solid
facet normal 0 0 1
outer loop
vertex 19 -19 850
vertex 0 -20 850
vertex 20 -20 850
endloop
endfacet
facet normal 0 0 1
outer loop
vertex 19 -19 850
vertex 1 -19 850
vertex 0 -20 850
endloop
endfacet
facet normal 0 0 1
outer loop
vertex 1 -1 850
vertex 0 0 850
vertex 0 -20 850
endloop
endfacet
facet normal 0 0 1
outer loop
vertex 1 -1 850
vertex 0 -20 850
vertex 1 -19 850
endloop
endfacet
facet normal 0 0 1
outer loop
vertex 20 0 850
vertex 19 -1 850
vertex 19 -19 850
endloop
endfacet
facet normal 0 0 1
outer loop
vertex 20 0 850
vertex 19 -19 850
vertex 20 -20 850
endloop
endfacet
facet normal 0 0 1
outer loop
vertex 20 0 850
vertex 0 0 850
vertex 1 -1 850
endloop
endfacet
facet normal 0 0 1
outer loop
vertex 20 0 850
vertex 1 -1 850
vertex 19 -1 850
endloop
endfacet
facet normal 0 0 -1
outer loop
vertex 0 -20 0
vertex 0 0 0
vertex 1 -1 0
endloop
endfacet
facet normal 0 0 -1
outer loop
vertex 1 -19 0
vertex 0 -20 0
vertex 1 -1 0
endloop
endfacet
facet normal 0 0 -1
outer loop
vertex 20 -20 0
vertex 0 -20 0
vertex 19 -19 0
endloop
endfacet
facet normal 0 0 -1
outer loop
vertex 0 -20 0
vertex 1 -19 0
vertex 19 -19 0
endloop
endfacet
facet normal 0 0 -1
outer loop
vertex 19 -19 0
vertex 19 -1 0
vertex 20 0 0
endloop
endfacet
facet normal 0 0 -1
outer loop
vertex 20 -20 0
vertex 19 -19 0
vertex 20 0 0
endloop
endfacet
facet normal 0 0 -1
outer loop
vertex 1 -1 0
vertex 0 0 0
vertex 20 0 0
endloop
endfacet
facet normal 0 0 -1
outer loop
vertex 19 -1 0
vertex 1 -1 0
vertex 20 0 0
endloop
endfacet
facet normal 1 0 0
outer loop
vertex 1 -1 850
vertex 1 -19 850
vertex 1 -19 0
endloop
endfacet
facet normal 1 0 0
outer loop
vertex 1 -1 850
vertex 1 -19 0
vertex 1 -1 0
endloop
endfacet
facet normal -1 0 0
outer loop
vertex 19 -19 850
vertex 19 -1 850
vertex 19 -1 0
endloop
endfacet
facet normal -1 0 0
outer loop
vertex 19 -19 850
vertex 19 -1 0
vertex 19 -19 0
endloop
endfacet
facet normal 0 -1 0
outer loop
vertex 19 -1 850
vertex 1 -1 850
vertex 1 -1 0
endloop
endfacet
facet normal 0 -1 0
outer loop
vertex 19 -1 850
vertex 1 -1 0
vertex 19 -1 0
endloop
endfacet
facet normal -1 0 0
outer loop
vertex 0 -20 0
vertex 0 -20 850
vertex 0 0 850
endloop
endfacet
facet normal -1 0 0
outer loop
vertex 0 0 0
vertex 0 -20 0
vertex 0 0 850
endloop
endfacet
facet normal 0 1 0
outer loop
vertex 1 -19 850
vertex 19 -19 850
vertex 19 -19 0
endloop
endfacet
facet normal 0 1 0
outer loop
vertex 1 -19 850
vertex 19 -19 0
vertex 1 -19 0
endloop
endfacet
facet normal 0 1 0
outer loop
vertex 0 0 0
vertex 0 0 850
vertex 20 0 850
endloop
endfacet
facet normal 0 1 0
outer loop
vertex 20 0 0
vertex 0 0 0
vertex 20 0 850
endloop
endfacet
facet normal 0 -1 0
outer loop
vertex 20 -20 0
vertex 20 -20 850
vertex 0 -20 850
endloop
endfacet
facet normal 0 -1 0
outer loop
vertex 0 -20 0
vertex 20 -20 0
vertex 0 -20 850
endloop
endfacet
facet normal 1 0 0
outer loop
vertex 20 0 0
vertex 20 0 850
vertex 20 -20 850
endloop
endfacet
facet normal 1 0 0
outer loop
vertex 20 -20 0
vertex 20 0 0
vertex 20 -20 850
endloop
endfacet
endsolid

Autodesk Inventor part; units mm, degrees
ref_plane "YZ Plane" through (0, 0, 0) normal (1, 0, 0) x (0, 1, 0)
ref_plane "XZ Plane" through (0, 0, 0) normal (0, 1, 0) x (-1, 0, 0)
ref_plane "XY Plane" through (0, 0, 0) normal (0, 0, 1) x (1, 0, 0)
sketch "Sketch1" plane through (0, 0, 0) normal (0, 0, 1) x (1, 0, 0)
  line L0 (0, 0) -> (20, 0)
  line L1 (20, 0) -> (20, -20)
  line L2 (20, -20) -> (0, -20)
  line L3 (0, -20) -> (0, 0)
  dimension "d0" = 20
  dimension "d1" = 20
extrude "Extrusion1" add sketch "Sketch1" along normal blind 850
sketch "Sketch2" plane through (0, 0, 850) normal (0, 0, 1) x (1, 0, 0)
  line L0 (1, -1) -> (19, -1)
  line L1 (19, -1) -> (19, -19)
  line L2 (19, -19) -> (1, -19)
  line L3 (1, -19) -> (1, -1)
  line L4 (0, 0) -> (0, -20) projected
  line L5 (20, 0) -> (0, 0) projected
  dimension "d4" = 1
  dimension "d5" = 1
  dimension "d6" = 18
  dimension "d7" = 18
extrude "Extrusion2" cut sketch "Sketch2" against normal through all
properties part number "profil_handle"
